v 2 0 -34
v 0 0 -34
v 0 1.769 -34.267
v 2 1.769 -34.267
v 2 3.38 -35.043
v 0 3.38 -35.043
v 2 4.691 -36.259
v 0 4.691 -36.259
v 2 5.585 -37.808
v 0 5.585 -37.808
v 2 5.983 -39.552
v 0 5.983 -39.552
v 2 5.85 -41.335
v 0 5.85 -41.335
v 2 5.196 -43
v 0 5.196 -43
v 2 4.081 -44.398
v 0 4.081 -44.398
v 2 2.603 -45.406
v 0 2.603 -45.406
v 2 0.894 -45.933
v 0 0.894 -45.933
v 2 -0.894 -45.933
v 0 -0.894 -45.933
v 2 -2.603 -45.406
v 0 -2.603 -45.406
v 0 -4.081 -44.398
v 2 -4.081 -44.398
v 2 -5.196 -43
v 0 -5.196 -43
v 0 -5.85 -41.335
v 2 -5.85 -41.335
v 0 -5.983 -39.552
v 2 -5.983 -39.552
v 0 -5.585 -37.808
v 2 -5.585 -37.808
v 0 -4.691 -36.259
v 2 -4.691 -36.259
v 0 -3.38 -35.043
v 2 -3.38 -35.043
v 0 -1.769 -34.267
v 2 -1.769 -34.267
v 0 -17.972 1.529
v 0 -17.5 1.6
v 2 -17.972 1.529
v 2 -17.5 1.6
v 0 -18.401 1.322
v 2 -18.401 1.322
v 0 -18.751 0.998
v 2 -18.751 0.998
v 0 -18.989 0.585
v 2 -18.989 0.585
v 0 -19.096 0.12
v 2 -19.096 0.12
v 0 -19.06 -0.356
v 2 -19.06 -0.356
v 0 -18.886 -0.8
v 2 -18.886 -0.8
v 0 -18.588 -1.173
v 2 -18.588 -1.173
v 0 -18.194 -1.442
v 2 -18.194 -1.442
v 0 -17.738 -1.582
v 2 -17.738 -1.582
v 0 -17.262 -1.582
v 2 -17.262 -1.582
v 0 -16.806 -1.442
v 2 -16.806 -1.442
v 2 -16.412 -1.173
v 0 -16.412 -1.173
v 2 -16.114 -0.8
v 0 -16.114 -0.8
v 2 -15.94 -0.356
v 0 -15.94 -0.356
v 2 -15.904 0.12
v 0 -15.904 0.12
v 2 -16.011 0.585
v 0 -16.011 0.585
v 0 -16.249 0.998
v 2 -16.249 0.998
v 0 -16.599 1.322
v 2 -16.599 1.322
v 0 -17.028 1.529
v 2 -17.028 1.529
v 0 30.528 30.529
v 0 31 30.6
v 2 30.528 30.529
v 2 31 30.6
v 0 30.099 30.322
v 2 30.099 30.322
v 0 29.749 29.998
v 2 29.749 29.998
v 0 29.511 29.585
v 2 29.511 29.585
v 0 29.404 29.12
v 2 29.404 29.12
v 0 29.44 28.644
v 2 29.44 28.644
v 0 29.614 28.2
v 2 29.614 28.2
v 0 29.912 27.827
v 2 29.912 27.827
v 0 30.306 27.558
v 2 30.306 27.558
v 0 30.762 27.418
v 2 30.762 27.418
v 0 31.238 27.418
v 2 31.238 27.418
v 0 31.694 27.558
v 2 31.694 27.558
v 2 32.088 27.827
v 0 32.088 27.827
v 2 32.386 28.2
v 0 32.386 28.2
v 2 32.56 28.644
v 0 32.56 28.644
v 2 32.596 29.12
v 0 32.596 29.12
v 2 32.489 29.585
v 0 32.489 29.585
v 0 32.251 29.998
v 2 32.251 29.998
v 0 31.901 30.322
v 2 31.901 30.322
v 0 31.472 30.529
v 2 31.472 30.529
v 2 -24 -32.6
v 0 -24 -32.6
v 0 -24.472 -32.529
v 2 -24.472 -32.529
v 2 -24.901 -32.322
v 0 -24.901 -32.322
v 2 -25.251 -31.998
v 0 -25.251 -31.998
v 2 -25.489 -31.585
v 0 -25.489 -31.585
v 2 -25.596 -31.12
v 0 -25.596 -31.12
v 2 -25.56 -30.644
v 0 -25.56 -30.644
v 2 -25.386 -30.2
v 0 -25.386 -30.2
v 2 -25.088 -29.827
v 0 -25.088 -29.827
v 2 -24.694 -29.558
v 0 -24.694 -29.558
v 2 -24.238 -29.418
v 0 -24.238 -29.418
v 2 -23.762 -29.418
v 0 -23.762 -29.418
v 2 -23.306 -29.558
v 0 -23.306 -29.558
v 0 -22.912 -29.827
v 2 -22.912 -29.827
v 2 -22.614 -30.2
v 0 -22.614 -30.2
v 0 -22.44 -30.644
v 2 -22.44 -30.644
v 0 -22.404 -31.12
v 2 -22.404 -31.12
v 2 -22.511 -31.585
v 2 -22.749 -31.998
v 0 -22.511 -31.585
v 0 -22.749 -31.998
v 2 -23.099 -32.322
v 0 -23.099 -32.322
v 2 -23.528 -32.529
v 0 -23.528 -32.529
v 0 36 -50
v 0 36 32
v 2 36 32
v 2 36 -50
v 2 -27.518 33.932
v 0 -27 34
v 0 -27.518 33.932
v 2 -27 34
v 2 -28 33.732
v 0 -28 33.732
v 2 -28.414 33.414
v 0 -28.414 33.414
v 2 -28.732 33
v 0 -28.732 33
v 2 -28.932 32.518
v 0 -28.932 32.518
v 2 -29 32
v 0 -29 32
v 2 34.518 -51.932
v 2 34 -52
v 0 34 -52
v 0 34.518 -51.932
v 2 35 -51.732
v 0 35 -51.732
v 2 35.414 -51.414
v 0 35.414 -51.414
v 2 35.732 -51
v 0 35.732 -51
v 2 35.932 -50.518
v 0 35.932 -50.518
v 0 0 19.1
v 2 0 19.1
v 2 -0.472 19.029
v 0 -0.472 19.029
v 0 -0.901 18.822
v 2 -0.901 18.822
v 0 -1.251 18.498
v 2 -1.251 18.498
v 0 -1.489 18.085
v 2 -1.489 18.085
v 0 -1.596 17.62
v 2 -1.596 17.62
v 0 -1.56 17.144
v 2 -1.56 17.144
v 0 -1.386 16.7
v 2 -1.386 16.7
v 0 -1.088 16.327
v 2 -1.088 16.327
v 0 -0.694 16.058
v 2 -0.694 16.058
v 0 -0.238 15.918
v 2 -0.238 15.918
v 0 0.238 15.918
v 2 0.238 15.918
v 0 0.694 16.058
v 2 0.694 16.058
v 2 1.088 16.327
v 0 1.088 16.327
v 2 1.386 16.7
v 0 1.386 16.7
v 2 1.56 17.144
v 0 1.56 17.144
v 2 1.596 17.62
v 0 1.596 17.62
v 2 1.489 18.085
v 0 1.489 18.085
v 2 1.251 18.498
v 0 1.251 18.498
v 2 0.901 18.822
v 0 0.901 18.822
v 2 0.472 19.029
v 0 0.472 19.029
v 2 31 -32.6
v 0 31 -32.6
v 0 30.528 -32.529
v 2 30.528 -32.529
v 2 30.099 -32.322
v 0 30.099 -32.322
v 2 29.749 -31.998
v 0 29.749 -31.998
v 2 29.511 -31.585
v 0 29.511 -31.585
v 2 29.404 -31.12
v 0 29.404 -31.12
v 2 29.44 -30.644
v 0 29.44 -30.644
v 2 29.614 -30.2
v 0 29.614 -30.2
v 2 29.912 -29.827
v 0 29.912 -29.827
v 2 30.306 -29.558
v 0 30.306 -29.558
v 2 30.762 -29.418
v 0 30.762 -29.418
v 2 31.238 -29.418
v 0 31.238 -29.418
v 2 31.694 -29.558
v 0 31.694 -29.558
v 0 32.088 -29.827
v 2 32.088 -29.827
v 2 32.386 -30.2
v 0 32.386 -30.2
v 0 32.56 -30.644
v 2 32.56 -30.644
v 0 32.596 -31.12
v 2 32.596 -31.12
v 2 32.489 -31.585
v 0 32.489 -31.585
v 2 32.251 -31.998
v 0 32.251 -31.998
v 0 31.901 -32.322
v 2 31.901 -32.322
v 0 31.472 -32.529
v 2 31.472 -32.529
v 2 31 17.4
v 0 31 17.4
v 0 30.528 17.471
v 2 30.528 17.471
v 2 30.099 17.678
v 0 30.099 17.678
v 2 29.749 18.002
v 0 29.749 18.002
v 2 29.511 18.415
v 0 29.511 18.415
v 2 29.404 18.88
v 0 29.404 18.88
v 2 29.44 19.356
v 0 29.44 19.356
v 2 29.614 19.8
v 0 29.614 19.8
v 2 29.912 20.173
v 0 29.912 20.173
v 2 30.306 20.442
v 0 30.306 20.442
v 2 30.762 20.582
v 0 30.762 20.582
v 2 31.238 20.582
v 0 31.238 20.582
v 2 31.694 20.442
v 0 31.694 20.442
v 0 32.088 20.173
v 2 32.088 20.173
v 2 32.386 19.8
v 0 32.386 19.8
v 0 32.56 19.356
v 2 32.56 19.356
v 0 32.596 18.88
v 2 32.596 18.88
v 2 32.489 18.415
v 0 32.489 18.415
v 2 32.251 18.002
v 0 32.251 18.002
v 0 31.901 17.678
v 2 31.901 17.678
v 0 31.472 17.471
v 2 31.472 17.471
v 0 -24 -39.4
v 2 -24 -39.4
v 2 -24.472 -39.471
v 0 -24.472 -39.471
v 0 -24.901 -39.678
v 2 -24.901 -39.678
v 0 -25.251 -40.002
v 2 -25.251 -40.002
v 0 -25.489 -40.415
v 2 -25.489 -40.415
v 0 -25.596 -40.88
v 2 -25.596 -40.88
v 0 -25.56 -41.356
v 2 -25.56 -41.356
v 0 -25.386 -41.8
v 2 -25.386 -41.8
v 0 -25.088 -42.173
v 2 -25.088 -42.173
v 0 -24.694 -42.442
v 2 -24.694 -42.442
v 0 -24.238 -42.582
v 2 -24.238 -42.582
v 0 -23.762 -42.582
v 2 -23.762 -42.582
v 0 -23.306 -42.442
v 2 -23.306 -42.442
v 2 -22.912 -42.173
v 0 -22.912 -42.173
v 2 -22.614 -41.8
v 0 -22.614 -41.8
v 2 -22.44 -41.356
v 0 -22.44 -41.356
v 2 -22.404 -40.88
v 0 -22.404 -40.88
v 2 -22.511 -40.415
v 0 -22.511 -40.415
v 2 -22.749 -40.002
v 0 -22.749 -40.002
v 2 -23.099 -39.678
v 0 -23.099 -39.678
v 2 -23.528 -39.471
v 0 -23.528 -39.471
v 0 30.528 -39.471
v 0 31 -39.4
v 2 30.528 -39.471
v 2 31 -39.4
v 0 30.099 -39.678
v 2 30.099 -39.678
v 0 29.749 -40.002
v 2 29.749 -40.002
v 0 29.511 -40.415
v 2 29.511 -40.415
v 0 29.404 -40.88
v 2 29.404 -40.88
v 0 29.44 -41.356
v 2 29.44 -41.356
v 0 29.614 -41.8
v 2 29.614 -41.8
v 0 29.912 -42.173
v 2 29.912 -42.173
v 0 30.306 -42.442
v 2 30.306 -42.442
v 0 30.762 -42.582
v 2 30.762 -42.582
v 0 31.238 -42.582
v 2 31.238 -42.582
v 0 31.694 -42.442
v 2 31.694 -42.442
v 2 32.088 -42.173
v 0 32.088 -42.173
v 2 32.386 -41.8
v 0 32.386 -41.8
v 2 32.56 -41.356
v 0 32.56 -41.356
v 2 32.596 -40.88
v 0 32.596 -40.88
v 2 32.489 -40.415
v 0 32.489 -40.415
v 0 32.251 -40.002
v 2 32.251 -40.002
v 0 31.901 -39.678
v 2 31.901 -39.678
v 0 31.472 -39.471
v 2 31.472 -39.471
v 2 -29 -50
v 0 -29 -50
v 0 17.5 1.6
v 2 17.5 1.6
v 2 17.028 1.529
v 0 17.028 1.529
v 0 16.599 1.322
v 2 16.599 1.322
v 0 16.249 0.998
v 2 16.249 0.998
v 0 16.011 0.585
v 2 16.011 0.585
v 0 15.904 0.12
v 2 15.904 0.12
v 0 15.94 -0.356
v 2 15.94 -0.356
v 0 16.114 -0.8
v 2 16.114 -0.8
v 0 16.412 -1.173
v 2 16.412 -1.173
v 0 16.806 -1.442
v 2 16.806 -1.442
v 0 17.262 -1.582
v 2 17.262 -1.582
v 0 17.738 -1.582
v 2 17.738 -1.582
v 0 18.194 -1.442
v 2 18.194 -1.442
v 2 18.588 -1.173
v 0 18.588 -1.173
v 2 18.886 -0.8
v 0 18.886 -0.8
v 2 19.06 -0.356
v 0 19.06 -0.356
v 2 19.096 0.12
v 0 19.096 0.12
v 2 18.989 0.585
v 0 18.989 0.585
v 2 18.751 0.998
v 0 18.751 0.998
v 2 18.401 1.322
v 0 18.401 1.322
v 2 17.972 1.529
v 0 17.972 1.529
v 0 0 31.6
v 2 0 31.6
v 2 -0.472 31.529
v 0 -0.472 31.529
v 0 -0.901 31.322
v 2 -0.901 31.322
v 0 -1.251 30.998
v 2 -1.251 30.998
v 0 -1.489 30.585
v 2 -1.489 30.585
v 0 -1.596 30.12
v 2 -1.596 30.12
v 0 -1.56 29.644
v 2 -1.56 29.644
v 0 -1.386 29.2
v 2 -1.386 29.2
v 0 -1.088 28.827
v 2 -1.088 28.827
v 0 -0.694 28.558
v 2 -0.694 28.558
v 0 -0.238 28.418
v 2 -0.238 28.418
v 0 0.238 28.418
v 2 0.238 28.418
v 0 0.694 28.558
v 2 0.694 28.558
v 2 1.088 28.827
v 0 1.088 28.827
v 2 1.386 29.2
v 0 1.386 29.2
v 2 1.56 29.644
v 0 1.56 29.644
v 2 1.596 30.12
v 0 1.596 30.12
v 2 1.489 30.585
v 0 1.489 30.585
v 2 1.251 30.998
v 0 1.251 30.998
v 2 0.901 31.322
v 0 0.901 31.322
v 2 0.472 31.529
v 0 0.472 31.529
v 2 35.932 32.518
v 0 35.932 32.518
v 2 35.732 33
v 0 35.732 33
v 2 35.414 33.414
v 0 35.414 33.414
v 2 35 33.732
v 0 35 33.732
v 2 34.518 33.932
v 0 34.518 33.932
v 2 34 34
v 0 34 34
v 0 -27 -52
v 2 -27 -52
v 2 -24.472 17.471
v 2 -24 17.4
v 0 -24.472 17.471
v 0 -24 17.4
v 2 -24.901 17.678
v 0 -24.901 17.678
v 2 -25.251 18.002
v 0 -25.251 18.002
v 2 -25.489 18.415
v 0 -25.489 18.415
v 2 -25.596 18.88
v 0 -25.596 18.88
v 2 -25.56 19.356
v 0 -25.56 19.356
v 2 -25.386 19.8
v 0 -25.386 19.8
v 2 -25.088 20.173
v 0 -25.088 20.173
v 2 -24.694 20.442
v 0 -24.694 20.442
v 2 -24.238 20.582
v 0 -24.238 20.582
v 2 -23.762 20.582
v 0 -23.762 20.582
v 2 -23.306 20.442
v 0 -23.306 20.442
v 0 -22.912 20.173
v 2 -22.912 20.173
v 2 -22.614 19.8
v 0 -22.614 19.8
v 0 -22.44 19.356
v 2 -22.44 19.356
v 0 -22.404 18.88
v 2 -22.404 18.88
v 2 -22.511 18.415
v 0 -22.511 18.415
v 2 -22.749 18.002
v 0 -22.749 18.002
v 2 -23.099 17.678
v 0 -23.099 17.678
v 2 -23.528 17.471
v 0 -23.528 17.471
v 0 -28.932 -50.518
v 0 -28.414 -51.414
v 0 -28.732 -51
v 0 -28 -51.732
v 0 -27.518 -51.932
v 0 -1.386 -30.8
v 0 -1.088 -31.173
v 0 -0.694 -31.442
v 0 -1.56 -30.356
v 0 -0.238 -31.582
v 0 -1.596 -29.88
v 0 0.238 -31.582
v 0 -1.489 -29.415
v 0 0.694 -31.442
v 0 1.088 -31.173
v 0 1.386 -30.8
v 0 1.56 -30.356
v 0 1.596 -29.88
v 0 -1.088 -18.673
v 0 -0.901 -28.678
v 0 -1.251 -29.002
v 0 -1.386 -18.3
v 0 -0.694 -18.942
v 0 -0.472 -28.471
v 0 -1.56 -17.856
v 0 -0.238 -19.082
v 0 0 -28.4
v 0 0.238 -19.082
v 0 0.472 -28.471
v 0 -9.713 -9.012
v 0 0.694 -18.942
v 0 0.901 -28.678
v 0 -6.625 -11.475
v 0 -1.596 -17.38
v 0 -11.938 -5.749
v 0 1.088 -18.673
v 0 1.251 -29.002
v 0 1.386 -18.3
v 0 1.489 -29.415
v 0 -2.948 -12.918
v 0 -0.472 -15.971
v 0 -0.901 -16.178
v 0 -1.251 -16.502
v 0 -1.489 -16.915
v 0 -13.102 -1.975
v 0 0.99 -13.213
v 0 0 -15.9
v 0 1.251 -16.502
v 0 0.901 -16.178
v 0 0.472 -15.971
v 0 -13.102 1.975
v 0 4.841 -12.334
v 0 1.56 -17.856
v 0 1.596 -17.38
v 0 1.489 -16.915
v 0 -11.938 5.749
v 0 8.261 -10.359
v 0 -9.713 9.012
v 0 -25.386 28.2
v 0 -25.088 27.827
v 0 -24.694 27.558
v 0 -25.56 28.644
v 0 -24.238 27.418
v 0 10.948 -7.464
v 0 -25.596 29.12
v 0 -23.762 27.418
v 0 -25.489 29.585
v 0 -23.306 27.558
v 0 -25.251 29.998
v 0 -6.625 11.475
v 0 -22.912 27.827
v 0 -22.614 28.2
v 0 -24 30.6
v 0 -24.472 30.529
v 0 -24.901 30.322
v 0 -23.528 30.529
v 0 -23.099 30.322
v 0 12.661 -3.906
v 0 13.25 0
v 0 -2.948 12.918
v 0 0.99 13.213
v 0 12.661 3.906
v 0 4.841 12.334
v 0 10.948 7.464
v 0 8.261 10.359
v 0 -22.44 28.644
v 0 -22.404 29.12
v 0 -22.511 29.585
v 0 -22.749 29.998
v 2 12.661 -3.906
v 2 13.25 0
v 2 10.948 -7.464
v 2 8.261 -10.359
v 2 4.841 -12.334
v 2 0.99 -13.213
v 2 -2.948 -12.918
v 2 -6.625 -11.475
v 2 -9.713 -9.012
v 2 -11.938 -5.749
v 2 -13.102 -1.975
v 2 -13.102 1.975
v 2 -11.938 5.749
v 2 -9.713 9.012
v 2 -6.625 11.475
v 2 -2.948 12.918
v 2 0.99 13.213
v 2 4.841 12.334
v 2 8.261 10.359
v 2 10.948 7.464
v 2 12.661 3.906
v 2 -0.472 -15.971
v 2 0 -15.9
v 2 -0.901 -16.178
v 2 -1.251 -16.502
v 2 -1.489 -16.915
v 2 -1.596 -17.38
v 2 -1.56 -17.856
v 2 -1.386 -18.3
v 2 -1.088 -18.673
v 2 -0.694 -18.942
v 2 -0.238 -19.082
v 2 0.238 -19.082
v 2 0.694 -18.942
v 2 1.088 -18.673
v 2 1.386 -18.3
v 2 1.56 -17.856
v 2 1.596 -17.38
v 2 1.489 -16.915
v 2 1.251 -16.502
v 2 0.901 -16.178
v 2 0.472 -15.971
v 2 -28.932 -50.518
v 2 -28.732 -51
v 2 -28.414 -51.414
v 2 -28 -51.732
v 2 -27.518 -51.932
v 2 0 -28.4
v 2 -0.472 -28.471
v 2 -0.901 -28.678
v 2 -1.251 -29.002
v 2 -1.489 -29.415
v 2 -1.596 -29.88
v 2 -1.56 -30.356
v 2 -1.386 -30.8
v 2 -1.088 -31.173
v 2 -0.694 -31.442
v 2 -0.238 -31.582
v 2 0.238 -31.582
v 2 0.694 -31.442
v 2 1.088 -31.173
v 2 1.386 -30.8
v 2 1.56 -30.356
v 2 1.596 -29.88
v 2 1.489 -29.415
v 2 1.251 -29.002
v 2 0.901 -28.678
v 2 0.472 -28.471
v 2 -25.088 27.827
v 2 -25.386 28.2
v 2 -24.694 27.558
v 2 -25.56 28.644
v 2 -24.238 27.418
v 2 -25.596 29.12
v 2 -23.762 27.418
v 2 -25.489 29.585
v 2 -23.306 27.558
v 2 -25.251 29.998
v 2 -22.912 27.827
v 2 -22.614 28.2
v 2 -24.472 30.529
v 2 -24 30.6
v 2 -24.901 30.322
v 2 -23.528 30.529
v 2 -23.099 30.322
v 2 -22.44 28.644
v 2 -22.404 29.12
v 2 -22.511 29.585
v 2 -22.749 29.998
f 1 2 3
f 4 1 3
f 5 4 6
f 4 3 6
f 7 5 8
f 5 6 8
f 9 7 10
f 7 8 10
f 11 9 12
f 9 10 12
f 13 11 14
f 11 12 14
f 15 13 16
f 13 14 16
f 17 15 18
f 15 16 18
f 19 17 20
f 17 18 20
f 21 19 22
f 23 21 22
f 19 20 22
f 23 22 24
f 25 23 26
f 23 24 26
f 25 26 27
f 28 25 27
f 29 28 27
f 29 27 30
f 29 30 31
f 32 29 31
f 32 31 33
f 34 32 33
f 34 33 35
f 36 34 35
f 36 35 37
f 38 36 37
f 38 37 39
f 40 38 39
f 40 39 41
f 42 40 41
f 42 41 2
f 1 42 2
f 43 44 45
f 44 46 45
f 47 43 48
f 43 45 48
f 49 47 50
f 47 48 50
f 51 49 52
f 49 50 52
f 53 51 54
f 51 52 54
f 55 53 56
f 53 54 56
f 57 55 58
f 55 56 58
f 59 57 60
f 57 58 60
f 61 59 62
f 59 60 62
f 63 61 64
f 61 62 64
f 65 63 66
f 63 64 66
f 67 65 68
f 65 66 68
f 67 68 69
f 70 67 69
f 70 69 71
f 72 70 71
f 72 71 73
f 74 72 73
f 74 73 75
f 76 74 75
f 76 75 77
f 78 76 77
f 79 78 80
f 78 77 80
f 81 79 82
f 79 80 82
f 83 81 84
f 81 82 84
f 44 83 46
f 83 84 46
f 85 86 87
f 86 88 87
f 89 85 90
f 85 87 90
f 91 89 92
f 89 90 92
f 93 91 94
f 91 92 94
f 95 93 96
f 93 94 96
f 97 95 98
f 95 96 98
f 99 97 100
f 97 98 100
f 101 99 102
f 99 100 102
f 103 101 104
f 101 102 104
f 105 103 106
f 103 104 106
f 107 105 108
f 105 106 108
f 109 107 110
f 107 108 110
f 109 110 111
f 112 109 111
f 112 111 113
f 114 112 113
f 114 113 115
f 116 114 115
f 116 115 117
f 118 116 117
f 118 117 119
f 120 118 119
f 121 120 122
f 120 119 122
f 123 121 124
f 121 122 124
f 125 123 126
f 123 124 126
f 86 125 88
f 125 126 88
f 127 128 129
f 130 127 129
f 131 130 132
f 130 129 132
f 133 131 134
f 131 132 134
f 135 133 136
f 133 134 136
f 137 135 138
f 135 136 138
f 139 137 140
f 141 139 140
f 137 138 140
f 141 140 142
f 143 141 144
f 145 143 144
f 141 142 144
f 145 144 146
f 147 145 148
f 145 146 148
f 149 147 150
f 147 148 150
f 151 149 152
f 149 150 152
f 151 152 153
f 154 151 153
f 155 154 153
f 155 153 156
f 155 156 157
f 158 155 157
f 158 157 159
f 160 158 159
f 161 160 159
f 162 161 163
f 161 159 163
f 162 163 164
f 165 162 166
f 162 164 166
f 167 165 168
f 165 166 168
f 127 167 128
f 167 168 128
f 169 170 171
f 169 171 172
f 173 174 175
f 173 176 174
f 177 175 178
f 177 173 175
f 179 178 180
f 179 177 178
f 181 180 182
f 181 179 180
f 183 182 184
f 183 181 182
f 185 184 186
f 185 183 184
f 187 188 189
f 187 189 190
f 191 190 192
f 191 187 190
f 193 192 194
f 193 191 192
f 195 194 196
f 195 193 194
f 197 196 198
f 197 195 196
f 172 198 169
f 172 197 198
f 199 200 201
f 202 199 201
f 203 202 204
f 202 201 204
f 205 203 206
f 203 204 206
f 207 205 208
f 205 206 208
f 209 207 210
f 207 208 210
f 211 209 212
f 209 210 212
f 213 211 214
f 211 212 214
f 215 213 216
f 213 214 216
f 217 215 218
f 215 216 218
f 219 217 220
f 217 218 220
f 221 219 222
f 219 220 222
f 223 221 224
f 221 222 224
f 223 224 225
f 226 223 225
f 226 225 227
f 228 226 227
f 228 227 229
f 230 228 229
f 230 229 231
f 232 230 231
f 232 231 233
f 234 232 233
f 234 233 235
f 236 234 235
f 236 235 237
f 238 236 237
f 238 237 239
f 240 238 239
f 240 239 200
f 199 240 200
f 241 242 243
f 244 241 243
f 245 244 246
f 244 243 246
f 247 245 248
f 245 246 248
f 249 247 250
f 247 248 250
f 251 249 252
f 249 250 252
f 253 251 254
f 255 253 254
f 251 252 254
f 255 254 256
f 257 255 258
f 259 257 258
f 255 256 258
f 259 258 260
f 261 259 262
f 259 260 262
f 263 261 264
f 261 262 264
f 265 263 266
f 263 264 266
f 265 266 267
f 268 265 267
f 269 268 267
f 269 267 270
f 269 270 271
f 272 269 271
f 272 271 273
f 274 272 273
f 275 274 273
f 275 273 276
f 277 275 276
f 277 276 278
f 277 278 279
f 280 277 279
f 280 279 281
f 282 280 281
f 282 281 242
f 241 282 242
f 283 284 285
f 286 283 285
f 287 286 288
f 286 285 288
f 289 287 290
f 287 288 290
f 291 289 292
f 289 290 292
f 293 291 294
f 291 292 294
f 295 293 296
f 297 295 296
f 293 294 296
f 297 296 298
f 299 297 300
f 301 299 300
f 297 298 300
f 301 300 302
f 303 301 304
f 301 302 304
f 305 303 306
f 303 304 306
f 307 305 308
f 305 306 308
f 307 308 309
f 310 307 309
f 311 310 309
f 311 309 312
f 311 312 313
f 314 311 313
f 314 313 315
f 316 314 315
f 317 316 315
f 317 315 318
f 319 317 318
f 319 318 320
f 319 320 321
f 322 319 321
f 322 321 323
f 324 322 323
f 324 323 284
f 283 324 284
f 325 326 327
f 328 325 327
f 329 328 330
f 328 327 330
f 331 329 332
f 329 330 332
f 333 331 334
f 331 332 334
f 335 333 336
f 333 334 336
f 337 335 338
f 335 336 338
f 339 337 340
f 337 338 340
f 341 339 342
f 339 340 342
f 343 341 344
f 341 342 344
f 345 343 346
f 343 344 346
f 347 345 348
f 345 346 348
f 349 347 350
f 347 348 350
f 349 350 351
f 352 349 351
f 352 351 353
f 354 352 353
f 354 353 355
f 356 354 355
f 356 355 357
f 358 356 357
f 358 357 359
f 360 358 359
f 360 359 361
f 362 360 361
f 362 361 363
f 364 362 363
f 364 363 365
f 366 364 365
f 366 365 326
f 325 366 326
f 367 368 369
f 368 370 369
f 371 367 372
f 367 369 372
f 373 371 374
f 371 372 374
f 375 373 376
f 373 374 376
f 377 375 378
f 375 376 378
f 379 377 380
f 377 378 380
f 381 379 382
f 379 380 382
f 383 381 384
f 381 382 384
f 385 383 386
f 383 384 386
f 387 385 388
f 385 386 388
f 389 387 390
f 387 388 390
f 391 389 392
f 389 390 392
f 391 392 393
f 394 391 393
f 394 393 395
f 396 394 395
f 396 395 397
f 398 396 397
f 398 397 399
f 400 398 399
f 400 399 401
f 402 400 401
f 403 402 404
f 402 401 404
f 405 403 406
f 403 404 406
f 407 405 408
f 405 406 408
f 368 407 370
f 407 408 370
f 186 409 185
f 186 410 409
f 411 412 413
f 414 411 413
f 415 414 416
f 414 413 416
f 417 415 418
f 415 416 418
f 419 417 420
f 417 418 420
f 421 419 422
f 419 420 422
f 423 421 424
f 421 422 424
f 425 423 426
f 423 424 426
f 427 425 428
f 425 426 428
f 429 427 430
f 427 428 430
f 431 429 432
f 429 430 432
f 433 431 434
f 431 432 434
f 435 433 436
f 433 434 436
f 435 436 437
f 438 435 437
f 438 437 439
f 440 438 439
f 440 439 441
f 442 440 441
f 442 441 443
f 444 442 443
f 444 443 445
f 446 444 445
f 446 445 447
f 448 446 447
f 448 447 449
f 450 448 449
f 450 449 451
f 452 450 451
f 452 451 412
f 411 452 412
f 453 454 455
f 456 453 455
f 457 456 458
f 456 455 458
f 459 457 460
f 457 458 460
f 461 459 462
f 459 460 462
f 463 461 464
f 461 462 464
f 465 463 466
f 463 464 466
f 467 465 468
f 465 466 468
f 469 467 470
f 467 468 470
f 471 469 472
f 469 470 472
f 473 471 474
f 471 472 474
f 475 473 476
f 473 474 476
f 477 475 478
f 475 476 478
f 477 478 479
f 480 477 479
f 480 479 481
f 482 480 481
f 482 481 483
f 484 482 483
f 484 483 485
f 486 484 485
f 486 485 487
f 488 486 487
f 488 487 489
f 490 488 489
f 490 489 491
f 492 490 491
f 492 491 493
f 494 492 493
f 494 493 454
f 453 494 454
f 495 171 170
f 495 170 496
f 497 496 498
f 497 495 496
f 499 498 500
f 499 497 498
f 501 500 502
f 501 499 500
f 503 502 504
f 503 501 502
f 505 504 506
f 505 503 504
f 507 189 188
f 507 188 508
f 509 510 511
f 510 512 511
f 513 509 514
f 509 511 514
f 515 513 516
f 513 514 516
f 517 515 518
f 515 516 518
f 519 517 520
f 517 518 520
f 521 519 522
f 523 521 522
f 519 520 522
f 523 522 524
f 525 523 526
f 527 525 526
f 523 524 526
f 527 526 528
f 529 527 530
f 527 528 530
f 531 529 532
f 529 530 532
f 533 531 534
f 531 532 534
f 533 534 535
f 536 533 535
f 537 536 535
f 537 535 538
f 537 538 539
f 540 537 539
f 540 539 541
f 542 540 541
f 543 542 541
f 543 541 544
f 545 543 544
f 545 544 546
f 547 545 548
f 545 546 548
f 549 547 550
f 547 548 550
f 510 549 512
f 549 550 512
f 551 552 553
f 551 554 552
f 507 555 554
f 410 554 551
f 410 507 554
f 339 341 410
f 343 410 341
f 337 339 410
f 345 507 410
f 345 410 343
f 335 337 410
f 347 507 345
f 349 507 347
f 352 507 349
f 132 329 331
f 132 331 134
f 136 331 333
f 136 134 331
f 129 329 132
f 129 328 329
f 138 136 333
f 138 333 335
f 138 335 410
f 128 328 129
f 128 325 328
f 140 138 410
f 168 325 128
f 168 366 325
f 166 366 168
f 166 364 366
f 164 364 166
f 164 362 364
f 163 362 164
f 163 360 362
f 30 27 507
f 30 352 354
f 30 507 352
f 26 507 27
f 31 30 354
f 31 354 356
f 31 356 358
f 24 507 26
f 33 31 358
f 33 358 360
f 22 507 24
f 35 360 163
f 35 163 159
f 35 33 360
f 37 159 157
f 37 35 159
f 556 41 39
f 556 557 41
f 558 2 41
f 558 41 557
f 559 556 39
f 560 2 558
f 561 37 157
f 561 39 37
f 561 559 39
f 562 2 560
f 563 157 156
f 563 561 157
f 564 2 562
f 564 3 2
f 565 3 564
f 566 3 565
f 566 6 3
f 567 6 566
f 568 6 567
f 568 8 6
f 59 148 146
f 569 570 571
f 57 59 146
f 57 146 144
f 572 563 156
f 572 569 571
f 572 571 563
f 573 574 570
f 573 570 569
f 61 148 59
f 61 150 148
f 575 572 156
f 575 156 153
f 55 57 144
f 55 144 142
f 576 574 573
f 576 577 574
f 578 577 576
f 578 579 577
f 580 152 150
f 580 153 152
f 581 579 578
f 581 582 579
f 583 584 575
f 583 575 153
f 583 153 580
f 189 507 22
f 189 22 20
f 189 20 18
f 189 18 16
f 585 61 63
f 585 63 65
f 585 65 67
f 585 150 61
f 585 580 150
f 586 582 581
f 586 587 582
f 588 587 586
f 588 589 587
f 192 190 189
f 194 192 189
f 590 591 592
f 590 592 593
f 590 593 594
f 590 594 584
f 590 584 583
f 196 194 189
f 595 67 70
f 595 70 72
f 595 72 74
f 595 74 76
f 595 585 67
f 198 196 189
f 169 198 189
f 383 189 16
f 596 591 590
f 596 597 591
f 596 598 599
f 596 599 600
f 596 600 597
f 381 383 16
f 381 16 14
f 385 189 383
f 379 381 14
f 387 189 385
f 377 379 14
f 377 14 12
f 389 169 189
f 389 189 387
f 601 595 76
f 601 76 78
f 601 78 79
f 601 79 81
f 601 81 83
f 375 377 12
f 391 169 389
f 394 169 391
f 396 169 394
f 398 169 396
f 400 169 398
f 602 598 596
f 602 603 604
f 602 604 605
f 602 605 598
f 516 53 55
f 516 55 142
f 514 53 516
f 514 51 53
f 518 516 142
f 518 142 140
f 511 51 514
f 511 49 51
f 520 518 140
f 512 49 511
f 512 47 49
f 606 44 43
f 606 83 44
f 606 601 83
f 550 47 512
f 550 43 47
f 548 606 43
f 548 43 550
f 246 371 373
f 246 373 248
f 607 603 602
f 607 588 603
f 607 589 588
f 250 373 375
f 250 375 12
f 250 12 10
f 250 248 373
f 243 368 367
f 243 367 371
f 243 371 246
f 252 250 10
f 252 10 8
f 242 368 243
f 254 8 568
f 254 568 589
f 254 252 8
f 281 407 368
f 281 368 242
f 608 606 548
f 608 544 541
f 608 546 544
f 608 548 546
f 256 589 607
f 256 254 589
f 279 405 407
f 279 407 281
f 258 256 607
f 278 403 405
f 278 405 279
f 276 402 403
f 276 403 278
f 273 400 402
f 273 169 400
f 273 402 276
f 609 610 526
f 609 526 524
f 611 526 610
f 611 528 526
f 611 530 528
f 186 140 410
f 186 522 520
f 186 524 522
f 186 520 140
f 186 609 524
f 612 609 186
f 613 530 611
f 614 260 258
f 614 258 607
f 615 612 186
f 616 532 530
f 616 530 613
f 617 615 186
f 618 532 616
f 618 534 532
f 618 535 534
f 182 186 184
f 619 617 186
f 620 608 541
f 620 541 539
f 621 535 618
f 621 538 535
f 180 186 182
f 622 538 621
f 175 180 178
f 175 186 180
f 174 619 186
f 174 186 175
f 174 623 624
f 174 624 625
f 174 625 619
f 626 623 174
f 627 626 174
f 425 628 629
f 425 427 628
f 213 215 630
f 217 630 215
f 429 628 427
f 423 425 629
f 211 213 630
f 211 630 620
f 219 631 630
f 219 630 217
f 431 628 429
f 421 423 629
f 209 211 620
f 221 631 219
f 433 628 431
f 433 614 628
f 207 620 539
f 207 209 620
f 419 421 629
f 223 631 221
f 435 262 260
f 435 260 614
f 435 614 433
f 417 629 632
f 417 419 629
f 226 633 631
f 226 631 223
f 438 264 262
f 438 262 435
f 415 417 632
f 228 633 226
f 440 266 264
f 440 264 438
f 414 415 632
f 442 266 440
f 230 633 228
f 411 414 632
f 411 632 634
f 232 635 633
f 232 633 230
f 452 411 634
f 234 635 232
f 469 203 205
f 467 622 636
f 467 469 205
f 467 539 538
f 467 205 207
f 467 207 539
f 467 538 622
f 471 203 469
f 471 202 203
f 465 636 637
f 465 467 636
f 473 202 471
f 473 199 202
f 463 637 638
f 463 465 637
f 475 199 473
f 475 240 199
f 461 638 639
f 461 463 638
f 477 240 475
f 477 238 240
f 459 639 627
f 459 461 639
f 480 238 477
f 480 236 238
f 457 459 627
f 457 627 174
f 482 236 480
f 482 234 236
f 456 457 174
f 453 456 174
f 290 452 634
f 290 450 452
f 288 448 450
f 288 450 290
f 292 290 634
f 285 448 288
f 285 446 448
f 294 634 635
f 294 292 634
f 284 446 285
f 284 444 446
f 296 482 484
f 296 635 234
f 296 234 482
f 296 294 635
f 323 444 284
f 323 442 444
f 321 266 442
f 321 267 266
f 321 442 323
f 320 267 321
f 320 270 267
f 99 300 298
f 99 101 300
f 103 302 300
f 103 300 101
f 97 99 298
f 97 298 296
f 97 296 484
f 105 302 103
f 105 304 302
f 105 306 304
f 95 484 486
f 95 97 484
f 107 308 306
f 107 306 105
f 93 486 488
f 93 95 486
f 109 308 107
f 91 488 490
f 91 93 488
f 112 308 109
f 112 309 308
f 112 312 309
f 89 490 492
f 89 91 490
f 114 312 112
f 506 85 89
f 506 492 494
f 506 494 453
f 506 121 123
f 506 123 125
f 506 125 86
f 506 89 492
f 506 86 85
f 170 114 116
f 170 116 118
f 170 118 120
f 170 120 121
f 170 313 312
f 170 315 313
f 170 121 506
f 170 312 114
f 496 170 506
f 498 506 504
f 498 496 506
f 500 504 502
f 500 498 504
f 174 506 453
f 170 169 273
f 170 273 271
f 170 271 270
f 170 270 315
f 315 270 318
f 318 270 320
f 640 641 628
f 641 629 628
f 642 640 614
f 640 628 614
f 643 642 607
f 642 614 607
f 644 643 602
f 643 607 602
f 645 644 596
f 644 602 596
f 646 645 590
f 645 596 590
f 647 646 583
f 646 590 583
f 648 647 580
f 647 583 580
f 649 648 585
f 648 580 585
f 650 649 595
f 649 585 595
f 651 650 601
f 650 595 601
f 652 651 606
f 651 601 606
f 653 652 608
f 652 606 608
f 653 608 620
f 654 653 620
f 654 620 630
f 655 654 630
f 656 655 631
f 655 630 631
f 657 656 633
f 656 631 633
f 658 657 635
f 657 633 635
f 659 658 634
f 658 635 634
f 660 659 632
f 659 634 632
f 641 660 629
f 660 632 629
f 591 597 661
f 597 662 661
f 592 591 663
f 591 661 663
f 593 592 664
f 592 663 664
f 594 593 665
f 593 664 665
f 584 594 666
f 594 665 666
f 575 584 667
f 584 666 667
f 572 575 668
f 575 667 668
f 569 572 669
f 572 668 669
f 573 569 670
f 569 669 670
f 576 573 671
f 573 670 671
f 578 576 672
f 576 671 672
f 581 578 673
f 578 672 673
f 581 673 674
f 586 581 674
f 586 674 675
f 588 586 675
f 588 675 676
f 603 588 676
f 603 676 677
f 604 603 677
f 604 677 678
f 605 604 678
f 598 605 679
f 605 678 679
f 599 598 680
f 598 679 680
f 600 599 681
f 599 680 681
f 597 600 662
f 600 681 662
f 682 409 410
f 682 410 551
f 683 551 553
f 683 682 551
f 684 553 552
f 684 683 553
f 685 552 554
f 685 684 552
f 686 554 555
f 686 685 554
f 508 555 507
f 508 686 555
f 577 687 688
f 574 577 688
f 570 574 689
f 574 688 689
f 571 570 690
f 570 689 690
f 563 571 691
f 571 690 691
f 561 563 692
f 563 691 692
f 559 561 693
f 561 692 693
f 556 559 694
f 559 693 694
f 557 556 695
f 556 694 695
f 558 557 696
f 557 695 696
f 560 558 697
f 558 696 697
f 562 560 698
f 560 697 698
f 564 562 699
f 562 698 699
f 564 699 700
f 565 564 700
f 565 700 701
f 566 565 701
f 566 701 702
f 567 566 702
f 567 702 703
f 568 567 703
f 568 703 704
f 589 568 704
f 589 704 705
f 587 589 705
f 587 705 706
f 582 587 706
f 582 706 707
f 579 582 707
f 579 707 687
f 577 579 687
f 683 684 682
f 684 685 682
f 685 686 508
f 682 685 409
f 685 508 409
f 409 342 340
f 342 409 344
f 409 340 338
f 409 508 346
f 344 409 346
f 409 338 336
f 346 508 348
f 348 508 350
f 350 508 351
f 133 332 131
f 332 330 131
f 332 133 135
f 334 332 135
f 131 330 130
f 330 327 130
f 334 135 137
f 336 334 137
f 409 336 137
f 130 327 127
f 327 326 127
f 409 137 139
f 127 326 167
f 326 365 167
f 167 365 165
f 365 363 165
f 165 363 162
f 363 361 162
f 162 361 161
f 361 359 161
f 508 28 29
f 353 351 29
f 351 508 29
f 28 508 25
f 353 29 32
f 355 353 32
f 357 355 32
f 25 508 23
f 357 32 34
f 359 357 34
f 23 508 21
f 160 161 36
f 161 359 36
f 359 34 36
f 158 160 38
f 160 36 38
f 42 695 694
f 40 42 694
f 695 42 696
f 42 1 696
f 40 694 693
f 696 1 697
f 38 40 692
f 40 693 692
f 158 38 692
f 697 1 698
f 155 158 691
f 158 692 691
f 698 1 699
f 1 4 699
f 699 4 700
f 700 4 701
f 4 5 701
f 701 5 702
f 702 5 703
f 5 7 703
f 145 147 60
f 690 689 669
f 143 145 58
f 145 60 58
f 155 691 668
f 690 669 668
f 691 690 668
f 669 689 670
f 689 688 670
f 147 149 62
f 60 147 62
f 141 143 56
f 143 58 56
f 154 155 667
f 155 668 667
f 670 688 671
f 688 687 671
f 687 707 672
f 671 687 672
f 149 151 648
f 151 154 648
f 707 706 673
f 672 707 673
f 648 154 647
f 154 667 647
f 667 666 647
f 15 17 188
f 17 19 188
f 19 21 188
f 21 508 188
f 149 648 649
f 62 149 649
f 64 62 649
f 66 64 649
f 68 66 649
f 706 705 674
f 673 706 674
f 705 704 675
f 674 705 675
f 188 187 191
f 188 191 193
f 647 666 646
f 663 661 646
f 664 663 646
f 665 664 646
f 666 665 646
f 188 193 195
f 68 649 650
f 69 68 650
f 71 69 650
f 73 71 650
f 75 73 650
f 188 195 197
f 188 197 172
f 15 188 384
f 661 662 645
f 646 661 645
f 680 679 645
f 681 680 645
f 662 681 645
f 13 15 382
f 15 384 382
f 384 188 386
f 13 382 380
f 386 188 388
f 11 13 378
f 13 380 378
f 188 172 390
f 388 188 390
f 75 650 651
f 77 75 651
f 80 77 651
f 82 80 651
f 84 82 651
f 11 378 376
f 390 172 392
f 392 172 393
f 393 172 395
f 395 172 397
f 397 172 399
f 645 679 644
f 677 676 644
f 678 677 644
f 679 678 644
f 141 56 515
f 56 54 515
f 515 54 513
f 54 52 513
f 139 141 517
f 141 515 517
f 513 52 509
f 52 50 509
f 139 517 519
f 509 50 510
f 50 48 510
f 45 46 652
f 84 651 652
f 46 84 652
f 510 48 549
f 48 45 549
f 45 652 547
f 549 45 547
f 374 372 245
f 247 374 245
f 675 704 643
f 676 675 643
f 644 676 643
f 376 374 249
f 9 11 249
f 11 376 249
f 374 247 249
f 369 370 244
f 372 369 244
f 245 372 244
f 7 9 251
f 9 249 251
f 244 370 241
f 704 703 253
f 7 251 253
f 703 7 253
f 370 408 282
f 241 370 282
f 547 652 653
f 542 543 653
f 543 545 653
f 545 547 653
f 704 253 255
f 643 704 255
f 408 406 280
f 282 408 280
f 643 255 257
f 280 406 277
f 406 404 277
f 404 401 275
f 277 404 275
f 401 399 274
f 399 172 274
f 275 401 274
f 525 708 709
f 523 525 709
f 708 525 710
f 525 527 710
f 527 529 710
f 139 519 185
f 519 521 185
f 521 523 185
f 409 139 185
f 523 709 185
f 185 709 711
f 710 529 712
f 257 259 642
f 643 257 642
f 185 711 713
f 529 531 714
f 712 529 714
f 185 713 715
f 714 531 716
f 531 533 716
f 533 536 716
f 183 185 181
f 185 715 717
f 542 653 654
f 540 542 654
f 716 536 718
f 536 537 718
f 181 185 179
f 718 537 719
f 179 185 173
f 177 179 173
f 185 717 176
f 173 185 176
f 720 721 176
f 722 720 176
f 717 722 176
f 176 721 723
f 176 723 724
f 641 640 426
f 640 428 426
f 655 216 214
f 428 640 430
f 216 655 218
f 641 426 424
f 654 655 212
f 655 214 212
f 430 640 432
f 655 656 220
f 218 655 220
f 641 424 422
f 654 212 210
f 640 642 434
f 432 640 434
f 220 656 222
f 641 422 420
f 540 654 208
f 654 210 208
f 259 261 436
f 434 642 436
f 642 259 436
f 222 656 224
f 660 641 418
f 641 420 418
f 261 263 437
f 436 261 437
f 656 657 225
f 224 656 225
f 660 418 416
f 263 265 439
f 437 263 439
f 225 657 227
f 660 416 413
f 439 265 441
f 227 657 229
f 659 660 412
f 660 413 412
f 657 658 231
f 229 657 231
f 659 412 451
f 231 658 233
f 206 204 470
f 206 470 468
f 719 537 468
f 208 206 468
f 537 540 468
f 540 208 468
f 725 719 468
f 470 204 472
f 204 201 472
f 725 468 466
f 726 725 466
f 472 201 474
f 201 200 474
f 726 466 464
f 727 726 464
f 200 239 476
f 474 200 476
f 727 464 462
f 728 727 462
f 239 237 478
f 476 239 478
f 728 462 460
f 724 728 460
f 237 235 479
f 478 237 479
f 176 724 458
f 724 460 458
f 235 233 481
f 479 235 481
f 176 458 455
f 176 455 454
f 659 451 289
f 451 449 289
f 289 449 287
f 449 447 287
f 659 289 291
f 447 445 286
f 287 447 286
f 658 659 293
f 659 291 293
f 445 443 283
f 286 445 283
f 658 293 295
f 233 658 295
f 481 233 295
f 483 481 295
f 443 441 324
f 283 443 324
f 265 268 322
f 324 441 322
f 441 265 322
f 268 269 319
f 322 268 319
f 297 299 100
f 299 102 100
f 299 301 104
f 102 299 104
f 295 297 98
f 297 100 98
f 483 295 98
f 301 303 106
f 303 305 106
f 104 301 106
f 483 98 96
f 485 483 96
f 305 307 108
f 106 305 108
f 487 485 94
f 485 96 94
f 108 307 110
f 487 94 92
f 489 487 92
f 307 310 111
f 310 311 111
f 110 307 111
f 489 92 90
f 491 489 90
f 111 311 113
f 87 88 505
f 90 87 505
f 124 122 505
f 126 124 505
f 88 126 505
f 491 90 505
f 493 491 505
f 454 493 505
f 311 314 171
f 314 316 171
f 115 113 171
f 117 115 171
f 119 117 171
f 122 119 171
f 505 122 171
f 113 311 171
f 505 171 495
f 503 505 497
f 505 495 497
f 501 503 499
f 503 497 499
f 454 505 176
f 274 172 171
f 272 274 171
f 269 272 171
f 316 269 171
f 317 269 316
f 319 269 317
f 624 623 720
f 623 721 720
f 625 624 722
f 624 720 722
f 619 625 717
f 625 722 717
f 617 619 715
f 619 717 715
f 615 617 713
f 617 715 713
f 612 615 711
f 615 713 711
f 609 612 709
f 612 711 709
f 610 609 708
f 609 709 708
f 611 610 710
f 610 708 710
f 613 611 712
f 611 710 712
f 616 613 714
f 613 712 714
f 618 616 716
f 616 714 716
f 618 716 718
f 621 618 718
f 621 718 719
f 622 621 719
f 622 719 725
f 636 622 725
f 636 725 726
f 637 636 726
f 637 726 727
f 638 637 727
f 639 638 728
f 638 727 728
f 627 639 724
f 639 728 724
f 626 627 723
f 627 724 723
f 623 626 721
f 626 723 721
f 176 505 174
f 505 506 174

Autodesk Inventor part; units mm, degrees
ref_plane "YZ Plane" through (0, 0, 0) normal (1, 0, 0) x (0, 1, 0)
ref_plane "XZ Plane" through (0, 0, 0) normal (0, 1, 0) x (-1, 0, 0)
ref_plane "XY Plane" through (0, 0, 0) normal (0, 0, 1) x (1, 0, 0)
sketch "Sketch1" plane through (0, 0, 0) normal (1, 0, 0) x (0, 1, 0)
  circle A0 centre (0, 0) radius 13.25
  line L0 (36, -46) -> (36, 34)
  line L1 (36, 34) -> (-29, 34)
  line L2 (-29, 34) -> (-29, -46)
  line L3 (-29, -46) -> (36, -46)
  point P0 (0, -17.5)
  point P1 (17.5, 0)
  point P2 (0, 17.5)
  point P3 (-17.5, 0)
  point P4 (0, -30)
  point P5 (0, 30)
  point P6 (31, -41)
  point P7 (31, 29)
  point P8 (-24, 29)
  point P9 (-24, -41)
  dimension "d0" = 26.5
  dimension "d1" = 17.5
  dimension "d4" = 360
  dimension "d6" = 30
  dimension "d9" = 360
  dimension "d15" = 5
  dimension "d16" = 5
  dimension "d17" = 80
  dimension "d18" = 65
  dimension "d28" = 5
  dimension "d29" = 55
  dimension "d30" = 55
extrude "Extrusion1" add sketch "Sketch1" along normal blind 2
hole "Hole1" at (0, 0, -17.5) at (0, 17.5, 0) at (0, 0, 17.5) at (0, -17.5, 0) at (0, 0, -30) at (0, 0, 30) at (0, 31, -41) at (0, 31, 29) at (0, -24, 29) at (0, -24, -41) direction (1, 0, 0) diameter 3.2 depth 43.75 tip angle 118
sketch "Sketch2" plane through (0, 0, 0) normal (-1, 0, 0) x (0, 0, 1)
  circle A0 centre (-40, 0) radius 6
  line L0 (-46, 36) -> (34, 36) projected
  line L1 (-46, 36) -> (-52, 36)
  line L2 (-52, 36) -> (-52, -29)
  line L3 (-52, -29) -> (-46, -29)
  line L4 (-46, -29) -> (-46, 36)
  point P0 (0, 0)
  point P1 (0, 25.1294)
  point P2 (0, -32.6005)
  dimension "d31" = 40
  dimension "d32" = 12
  dimension "d33" = 6
extrude "Extrusion2" add sketch "Sketch2" against normal blind 2 contours L4 L3 L2 L1
extrude "Extrusion3" cut sketch "Sketch2" against normal blind 2 contours A0
sketch "Sketch3" plane through (2, 0, 0) normal (1, 0, 0) x (0, 0, -1)
  circle A0 centre (41, 31) radius 1.6 projected
  circle A1 centre (-29, 31) radius 1.6 projected
  circle A2 centre (-29, -24) radius 1.6 projected
  circle A3 centre (41, -24) radius 1.6 projected
  point P0 (0, 0)
  point P1 (-19, 31)
  point P2 (31, 31)
  point P3 (-19, -24)
  point P4 (31, -24)
  dimension "d38" = 10
  dimension "d39" = 10
  dimension "d40" = 10
  dimension "d41" = 10
hole "Hole2" at (2, 31, 19) at (2, 31, -31) at (2, -24, 19) at (2, -24, -31) direction (-1, 0, 0) diameter 3.2 depth 43.75 tip angle 118
fillet "Fillet1" radius 2 4 edges at (1, 36, 34) (1, 36, -52) (1, -29, -52) (1, -29, 34)
properties part number "motor" material "アルミニウム 6061"
